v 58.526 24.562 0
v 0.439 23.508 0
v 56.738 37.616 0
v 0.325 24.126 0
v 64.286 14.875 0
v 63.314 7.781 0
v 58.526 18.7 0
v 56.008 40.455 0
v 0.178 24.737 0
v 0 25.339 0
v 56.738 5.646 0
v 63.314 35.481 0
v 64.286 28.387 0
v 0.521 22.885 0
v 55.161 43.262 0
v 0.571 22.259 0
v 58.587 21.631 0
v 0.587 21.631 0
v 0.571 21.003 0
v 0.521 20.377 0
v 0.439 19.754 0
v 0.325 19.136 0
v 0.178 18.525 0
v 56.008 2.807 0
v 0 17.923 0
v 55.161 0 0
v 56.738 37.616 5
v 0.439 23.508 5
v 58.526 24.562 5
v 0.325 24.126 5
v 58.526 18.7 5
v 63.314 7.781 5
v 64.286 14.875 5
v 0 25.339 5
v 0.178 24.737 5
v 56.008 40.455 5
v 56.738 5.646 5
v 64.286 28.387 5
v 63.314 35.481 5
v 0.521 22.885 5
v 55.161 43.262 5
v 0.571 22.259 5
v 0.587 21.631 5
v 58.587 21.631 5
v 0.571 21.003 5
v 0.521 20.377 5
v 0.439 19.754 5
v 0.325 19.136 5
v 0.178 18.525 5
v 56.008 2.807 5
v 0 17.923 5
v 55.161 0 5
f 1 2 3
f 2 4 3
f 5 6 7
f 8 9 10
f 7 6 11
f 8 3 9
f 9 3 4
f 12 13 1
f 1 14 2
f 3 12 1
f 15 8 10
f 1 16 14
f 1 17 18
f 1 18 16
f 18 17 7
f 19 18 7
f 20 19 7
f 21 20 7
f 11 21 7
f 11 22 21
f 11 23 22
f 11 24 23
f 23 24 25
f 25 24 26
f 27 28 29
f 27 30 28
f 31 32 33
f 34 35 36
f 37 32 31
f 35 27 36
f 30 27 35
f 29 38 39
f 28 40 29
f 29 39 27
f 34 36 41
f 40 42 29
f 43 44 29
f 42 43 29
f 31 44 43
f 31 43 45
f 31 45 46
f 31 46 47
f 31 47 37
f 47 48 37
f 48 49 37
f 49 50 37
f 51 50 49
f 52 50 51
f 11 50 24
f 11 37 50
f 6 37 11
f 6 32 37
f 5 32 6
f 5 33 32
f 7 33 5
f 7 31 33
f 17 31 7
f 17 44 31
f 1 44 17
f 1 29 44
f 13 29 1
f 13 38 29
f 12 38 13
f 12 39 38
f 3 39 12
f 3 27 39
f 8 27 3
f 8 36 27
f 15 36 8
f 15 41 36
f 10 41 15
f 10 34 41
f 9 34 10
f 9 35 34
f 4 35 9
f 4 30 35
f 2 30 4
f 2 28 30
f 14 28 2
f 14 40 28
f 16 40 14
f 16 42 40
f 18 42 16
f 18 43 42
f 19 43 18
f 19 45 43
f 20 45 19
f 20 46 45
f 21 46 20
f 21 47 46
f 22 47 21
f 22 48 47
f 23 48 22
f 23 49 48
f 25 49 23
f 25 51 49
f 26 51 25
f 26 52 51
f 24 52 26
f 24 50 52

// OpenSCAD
$fn = 32;

// ----------------------------------------------------------------------
// Gear sector: 2 teeth on 36 degrees
// ----------------------------------------------------------------------

// --- parameters (mm) ---
sector_angle = 36;        // sector angle, degrees
root_r = 70;              // root circle radius
tooth_h = 6;              // tooth height over the root circle
teeth = 2;                // number of teeth on the sector
hub_r = 12;               // hub bore radius
plate_t = 5;              // sector thickness, Z
arc_step = 3;             // sampling step of the root/hub arcs, degrees

tip_r = root_r + tooth_h;  // tip circle radius

profile = [[55.161, 0], [56.008, 2.807], [56.738, 5.646], [63.314, 7.781], [64.286, 14.875], [58.526, 18.7], [58.587, 21.631], [58.526, 24.562], [64.286, 28.387], [63.314, 35.481], [56.738, 37.616], [56.008, 40.455], [55.161, 43.262], [0, 25.339], [0.178, 24.737], [0.325, 24.126], [0.439, 23.508], [0.521, 22.885], [0.571, 22.259], [0.587, 21.631], [0.571, 21.003], [0.521, 20.377], [0.439, 19.754], [0.325, 19.136], [0.178, 18.525], [0, 17.923]];  // primary outline, 26 points, counter clockwise

// --- the one profile operation ---
linear_extrude(height = plate_t) polygon(points = profile);
